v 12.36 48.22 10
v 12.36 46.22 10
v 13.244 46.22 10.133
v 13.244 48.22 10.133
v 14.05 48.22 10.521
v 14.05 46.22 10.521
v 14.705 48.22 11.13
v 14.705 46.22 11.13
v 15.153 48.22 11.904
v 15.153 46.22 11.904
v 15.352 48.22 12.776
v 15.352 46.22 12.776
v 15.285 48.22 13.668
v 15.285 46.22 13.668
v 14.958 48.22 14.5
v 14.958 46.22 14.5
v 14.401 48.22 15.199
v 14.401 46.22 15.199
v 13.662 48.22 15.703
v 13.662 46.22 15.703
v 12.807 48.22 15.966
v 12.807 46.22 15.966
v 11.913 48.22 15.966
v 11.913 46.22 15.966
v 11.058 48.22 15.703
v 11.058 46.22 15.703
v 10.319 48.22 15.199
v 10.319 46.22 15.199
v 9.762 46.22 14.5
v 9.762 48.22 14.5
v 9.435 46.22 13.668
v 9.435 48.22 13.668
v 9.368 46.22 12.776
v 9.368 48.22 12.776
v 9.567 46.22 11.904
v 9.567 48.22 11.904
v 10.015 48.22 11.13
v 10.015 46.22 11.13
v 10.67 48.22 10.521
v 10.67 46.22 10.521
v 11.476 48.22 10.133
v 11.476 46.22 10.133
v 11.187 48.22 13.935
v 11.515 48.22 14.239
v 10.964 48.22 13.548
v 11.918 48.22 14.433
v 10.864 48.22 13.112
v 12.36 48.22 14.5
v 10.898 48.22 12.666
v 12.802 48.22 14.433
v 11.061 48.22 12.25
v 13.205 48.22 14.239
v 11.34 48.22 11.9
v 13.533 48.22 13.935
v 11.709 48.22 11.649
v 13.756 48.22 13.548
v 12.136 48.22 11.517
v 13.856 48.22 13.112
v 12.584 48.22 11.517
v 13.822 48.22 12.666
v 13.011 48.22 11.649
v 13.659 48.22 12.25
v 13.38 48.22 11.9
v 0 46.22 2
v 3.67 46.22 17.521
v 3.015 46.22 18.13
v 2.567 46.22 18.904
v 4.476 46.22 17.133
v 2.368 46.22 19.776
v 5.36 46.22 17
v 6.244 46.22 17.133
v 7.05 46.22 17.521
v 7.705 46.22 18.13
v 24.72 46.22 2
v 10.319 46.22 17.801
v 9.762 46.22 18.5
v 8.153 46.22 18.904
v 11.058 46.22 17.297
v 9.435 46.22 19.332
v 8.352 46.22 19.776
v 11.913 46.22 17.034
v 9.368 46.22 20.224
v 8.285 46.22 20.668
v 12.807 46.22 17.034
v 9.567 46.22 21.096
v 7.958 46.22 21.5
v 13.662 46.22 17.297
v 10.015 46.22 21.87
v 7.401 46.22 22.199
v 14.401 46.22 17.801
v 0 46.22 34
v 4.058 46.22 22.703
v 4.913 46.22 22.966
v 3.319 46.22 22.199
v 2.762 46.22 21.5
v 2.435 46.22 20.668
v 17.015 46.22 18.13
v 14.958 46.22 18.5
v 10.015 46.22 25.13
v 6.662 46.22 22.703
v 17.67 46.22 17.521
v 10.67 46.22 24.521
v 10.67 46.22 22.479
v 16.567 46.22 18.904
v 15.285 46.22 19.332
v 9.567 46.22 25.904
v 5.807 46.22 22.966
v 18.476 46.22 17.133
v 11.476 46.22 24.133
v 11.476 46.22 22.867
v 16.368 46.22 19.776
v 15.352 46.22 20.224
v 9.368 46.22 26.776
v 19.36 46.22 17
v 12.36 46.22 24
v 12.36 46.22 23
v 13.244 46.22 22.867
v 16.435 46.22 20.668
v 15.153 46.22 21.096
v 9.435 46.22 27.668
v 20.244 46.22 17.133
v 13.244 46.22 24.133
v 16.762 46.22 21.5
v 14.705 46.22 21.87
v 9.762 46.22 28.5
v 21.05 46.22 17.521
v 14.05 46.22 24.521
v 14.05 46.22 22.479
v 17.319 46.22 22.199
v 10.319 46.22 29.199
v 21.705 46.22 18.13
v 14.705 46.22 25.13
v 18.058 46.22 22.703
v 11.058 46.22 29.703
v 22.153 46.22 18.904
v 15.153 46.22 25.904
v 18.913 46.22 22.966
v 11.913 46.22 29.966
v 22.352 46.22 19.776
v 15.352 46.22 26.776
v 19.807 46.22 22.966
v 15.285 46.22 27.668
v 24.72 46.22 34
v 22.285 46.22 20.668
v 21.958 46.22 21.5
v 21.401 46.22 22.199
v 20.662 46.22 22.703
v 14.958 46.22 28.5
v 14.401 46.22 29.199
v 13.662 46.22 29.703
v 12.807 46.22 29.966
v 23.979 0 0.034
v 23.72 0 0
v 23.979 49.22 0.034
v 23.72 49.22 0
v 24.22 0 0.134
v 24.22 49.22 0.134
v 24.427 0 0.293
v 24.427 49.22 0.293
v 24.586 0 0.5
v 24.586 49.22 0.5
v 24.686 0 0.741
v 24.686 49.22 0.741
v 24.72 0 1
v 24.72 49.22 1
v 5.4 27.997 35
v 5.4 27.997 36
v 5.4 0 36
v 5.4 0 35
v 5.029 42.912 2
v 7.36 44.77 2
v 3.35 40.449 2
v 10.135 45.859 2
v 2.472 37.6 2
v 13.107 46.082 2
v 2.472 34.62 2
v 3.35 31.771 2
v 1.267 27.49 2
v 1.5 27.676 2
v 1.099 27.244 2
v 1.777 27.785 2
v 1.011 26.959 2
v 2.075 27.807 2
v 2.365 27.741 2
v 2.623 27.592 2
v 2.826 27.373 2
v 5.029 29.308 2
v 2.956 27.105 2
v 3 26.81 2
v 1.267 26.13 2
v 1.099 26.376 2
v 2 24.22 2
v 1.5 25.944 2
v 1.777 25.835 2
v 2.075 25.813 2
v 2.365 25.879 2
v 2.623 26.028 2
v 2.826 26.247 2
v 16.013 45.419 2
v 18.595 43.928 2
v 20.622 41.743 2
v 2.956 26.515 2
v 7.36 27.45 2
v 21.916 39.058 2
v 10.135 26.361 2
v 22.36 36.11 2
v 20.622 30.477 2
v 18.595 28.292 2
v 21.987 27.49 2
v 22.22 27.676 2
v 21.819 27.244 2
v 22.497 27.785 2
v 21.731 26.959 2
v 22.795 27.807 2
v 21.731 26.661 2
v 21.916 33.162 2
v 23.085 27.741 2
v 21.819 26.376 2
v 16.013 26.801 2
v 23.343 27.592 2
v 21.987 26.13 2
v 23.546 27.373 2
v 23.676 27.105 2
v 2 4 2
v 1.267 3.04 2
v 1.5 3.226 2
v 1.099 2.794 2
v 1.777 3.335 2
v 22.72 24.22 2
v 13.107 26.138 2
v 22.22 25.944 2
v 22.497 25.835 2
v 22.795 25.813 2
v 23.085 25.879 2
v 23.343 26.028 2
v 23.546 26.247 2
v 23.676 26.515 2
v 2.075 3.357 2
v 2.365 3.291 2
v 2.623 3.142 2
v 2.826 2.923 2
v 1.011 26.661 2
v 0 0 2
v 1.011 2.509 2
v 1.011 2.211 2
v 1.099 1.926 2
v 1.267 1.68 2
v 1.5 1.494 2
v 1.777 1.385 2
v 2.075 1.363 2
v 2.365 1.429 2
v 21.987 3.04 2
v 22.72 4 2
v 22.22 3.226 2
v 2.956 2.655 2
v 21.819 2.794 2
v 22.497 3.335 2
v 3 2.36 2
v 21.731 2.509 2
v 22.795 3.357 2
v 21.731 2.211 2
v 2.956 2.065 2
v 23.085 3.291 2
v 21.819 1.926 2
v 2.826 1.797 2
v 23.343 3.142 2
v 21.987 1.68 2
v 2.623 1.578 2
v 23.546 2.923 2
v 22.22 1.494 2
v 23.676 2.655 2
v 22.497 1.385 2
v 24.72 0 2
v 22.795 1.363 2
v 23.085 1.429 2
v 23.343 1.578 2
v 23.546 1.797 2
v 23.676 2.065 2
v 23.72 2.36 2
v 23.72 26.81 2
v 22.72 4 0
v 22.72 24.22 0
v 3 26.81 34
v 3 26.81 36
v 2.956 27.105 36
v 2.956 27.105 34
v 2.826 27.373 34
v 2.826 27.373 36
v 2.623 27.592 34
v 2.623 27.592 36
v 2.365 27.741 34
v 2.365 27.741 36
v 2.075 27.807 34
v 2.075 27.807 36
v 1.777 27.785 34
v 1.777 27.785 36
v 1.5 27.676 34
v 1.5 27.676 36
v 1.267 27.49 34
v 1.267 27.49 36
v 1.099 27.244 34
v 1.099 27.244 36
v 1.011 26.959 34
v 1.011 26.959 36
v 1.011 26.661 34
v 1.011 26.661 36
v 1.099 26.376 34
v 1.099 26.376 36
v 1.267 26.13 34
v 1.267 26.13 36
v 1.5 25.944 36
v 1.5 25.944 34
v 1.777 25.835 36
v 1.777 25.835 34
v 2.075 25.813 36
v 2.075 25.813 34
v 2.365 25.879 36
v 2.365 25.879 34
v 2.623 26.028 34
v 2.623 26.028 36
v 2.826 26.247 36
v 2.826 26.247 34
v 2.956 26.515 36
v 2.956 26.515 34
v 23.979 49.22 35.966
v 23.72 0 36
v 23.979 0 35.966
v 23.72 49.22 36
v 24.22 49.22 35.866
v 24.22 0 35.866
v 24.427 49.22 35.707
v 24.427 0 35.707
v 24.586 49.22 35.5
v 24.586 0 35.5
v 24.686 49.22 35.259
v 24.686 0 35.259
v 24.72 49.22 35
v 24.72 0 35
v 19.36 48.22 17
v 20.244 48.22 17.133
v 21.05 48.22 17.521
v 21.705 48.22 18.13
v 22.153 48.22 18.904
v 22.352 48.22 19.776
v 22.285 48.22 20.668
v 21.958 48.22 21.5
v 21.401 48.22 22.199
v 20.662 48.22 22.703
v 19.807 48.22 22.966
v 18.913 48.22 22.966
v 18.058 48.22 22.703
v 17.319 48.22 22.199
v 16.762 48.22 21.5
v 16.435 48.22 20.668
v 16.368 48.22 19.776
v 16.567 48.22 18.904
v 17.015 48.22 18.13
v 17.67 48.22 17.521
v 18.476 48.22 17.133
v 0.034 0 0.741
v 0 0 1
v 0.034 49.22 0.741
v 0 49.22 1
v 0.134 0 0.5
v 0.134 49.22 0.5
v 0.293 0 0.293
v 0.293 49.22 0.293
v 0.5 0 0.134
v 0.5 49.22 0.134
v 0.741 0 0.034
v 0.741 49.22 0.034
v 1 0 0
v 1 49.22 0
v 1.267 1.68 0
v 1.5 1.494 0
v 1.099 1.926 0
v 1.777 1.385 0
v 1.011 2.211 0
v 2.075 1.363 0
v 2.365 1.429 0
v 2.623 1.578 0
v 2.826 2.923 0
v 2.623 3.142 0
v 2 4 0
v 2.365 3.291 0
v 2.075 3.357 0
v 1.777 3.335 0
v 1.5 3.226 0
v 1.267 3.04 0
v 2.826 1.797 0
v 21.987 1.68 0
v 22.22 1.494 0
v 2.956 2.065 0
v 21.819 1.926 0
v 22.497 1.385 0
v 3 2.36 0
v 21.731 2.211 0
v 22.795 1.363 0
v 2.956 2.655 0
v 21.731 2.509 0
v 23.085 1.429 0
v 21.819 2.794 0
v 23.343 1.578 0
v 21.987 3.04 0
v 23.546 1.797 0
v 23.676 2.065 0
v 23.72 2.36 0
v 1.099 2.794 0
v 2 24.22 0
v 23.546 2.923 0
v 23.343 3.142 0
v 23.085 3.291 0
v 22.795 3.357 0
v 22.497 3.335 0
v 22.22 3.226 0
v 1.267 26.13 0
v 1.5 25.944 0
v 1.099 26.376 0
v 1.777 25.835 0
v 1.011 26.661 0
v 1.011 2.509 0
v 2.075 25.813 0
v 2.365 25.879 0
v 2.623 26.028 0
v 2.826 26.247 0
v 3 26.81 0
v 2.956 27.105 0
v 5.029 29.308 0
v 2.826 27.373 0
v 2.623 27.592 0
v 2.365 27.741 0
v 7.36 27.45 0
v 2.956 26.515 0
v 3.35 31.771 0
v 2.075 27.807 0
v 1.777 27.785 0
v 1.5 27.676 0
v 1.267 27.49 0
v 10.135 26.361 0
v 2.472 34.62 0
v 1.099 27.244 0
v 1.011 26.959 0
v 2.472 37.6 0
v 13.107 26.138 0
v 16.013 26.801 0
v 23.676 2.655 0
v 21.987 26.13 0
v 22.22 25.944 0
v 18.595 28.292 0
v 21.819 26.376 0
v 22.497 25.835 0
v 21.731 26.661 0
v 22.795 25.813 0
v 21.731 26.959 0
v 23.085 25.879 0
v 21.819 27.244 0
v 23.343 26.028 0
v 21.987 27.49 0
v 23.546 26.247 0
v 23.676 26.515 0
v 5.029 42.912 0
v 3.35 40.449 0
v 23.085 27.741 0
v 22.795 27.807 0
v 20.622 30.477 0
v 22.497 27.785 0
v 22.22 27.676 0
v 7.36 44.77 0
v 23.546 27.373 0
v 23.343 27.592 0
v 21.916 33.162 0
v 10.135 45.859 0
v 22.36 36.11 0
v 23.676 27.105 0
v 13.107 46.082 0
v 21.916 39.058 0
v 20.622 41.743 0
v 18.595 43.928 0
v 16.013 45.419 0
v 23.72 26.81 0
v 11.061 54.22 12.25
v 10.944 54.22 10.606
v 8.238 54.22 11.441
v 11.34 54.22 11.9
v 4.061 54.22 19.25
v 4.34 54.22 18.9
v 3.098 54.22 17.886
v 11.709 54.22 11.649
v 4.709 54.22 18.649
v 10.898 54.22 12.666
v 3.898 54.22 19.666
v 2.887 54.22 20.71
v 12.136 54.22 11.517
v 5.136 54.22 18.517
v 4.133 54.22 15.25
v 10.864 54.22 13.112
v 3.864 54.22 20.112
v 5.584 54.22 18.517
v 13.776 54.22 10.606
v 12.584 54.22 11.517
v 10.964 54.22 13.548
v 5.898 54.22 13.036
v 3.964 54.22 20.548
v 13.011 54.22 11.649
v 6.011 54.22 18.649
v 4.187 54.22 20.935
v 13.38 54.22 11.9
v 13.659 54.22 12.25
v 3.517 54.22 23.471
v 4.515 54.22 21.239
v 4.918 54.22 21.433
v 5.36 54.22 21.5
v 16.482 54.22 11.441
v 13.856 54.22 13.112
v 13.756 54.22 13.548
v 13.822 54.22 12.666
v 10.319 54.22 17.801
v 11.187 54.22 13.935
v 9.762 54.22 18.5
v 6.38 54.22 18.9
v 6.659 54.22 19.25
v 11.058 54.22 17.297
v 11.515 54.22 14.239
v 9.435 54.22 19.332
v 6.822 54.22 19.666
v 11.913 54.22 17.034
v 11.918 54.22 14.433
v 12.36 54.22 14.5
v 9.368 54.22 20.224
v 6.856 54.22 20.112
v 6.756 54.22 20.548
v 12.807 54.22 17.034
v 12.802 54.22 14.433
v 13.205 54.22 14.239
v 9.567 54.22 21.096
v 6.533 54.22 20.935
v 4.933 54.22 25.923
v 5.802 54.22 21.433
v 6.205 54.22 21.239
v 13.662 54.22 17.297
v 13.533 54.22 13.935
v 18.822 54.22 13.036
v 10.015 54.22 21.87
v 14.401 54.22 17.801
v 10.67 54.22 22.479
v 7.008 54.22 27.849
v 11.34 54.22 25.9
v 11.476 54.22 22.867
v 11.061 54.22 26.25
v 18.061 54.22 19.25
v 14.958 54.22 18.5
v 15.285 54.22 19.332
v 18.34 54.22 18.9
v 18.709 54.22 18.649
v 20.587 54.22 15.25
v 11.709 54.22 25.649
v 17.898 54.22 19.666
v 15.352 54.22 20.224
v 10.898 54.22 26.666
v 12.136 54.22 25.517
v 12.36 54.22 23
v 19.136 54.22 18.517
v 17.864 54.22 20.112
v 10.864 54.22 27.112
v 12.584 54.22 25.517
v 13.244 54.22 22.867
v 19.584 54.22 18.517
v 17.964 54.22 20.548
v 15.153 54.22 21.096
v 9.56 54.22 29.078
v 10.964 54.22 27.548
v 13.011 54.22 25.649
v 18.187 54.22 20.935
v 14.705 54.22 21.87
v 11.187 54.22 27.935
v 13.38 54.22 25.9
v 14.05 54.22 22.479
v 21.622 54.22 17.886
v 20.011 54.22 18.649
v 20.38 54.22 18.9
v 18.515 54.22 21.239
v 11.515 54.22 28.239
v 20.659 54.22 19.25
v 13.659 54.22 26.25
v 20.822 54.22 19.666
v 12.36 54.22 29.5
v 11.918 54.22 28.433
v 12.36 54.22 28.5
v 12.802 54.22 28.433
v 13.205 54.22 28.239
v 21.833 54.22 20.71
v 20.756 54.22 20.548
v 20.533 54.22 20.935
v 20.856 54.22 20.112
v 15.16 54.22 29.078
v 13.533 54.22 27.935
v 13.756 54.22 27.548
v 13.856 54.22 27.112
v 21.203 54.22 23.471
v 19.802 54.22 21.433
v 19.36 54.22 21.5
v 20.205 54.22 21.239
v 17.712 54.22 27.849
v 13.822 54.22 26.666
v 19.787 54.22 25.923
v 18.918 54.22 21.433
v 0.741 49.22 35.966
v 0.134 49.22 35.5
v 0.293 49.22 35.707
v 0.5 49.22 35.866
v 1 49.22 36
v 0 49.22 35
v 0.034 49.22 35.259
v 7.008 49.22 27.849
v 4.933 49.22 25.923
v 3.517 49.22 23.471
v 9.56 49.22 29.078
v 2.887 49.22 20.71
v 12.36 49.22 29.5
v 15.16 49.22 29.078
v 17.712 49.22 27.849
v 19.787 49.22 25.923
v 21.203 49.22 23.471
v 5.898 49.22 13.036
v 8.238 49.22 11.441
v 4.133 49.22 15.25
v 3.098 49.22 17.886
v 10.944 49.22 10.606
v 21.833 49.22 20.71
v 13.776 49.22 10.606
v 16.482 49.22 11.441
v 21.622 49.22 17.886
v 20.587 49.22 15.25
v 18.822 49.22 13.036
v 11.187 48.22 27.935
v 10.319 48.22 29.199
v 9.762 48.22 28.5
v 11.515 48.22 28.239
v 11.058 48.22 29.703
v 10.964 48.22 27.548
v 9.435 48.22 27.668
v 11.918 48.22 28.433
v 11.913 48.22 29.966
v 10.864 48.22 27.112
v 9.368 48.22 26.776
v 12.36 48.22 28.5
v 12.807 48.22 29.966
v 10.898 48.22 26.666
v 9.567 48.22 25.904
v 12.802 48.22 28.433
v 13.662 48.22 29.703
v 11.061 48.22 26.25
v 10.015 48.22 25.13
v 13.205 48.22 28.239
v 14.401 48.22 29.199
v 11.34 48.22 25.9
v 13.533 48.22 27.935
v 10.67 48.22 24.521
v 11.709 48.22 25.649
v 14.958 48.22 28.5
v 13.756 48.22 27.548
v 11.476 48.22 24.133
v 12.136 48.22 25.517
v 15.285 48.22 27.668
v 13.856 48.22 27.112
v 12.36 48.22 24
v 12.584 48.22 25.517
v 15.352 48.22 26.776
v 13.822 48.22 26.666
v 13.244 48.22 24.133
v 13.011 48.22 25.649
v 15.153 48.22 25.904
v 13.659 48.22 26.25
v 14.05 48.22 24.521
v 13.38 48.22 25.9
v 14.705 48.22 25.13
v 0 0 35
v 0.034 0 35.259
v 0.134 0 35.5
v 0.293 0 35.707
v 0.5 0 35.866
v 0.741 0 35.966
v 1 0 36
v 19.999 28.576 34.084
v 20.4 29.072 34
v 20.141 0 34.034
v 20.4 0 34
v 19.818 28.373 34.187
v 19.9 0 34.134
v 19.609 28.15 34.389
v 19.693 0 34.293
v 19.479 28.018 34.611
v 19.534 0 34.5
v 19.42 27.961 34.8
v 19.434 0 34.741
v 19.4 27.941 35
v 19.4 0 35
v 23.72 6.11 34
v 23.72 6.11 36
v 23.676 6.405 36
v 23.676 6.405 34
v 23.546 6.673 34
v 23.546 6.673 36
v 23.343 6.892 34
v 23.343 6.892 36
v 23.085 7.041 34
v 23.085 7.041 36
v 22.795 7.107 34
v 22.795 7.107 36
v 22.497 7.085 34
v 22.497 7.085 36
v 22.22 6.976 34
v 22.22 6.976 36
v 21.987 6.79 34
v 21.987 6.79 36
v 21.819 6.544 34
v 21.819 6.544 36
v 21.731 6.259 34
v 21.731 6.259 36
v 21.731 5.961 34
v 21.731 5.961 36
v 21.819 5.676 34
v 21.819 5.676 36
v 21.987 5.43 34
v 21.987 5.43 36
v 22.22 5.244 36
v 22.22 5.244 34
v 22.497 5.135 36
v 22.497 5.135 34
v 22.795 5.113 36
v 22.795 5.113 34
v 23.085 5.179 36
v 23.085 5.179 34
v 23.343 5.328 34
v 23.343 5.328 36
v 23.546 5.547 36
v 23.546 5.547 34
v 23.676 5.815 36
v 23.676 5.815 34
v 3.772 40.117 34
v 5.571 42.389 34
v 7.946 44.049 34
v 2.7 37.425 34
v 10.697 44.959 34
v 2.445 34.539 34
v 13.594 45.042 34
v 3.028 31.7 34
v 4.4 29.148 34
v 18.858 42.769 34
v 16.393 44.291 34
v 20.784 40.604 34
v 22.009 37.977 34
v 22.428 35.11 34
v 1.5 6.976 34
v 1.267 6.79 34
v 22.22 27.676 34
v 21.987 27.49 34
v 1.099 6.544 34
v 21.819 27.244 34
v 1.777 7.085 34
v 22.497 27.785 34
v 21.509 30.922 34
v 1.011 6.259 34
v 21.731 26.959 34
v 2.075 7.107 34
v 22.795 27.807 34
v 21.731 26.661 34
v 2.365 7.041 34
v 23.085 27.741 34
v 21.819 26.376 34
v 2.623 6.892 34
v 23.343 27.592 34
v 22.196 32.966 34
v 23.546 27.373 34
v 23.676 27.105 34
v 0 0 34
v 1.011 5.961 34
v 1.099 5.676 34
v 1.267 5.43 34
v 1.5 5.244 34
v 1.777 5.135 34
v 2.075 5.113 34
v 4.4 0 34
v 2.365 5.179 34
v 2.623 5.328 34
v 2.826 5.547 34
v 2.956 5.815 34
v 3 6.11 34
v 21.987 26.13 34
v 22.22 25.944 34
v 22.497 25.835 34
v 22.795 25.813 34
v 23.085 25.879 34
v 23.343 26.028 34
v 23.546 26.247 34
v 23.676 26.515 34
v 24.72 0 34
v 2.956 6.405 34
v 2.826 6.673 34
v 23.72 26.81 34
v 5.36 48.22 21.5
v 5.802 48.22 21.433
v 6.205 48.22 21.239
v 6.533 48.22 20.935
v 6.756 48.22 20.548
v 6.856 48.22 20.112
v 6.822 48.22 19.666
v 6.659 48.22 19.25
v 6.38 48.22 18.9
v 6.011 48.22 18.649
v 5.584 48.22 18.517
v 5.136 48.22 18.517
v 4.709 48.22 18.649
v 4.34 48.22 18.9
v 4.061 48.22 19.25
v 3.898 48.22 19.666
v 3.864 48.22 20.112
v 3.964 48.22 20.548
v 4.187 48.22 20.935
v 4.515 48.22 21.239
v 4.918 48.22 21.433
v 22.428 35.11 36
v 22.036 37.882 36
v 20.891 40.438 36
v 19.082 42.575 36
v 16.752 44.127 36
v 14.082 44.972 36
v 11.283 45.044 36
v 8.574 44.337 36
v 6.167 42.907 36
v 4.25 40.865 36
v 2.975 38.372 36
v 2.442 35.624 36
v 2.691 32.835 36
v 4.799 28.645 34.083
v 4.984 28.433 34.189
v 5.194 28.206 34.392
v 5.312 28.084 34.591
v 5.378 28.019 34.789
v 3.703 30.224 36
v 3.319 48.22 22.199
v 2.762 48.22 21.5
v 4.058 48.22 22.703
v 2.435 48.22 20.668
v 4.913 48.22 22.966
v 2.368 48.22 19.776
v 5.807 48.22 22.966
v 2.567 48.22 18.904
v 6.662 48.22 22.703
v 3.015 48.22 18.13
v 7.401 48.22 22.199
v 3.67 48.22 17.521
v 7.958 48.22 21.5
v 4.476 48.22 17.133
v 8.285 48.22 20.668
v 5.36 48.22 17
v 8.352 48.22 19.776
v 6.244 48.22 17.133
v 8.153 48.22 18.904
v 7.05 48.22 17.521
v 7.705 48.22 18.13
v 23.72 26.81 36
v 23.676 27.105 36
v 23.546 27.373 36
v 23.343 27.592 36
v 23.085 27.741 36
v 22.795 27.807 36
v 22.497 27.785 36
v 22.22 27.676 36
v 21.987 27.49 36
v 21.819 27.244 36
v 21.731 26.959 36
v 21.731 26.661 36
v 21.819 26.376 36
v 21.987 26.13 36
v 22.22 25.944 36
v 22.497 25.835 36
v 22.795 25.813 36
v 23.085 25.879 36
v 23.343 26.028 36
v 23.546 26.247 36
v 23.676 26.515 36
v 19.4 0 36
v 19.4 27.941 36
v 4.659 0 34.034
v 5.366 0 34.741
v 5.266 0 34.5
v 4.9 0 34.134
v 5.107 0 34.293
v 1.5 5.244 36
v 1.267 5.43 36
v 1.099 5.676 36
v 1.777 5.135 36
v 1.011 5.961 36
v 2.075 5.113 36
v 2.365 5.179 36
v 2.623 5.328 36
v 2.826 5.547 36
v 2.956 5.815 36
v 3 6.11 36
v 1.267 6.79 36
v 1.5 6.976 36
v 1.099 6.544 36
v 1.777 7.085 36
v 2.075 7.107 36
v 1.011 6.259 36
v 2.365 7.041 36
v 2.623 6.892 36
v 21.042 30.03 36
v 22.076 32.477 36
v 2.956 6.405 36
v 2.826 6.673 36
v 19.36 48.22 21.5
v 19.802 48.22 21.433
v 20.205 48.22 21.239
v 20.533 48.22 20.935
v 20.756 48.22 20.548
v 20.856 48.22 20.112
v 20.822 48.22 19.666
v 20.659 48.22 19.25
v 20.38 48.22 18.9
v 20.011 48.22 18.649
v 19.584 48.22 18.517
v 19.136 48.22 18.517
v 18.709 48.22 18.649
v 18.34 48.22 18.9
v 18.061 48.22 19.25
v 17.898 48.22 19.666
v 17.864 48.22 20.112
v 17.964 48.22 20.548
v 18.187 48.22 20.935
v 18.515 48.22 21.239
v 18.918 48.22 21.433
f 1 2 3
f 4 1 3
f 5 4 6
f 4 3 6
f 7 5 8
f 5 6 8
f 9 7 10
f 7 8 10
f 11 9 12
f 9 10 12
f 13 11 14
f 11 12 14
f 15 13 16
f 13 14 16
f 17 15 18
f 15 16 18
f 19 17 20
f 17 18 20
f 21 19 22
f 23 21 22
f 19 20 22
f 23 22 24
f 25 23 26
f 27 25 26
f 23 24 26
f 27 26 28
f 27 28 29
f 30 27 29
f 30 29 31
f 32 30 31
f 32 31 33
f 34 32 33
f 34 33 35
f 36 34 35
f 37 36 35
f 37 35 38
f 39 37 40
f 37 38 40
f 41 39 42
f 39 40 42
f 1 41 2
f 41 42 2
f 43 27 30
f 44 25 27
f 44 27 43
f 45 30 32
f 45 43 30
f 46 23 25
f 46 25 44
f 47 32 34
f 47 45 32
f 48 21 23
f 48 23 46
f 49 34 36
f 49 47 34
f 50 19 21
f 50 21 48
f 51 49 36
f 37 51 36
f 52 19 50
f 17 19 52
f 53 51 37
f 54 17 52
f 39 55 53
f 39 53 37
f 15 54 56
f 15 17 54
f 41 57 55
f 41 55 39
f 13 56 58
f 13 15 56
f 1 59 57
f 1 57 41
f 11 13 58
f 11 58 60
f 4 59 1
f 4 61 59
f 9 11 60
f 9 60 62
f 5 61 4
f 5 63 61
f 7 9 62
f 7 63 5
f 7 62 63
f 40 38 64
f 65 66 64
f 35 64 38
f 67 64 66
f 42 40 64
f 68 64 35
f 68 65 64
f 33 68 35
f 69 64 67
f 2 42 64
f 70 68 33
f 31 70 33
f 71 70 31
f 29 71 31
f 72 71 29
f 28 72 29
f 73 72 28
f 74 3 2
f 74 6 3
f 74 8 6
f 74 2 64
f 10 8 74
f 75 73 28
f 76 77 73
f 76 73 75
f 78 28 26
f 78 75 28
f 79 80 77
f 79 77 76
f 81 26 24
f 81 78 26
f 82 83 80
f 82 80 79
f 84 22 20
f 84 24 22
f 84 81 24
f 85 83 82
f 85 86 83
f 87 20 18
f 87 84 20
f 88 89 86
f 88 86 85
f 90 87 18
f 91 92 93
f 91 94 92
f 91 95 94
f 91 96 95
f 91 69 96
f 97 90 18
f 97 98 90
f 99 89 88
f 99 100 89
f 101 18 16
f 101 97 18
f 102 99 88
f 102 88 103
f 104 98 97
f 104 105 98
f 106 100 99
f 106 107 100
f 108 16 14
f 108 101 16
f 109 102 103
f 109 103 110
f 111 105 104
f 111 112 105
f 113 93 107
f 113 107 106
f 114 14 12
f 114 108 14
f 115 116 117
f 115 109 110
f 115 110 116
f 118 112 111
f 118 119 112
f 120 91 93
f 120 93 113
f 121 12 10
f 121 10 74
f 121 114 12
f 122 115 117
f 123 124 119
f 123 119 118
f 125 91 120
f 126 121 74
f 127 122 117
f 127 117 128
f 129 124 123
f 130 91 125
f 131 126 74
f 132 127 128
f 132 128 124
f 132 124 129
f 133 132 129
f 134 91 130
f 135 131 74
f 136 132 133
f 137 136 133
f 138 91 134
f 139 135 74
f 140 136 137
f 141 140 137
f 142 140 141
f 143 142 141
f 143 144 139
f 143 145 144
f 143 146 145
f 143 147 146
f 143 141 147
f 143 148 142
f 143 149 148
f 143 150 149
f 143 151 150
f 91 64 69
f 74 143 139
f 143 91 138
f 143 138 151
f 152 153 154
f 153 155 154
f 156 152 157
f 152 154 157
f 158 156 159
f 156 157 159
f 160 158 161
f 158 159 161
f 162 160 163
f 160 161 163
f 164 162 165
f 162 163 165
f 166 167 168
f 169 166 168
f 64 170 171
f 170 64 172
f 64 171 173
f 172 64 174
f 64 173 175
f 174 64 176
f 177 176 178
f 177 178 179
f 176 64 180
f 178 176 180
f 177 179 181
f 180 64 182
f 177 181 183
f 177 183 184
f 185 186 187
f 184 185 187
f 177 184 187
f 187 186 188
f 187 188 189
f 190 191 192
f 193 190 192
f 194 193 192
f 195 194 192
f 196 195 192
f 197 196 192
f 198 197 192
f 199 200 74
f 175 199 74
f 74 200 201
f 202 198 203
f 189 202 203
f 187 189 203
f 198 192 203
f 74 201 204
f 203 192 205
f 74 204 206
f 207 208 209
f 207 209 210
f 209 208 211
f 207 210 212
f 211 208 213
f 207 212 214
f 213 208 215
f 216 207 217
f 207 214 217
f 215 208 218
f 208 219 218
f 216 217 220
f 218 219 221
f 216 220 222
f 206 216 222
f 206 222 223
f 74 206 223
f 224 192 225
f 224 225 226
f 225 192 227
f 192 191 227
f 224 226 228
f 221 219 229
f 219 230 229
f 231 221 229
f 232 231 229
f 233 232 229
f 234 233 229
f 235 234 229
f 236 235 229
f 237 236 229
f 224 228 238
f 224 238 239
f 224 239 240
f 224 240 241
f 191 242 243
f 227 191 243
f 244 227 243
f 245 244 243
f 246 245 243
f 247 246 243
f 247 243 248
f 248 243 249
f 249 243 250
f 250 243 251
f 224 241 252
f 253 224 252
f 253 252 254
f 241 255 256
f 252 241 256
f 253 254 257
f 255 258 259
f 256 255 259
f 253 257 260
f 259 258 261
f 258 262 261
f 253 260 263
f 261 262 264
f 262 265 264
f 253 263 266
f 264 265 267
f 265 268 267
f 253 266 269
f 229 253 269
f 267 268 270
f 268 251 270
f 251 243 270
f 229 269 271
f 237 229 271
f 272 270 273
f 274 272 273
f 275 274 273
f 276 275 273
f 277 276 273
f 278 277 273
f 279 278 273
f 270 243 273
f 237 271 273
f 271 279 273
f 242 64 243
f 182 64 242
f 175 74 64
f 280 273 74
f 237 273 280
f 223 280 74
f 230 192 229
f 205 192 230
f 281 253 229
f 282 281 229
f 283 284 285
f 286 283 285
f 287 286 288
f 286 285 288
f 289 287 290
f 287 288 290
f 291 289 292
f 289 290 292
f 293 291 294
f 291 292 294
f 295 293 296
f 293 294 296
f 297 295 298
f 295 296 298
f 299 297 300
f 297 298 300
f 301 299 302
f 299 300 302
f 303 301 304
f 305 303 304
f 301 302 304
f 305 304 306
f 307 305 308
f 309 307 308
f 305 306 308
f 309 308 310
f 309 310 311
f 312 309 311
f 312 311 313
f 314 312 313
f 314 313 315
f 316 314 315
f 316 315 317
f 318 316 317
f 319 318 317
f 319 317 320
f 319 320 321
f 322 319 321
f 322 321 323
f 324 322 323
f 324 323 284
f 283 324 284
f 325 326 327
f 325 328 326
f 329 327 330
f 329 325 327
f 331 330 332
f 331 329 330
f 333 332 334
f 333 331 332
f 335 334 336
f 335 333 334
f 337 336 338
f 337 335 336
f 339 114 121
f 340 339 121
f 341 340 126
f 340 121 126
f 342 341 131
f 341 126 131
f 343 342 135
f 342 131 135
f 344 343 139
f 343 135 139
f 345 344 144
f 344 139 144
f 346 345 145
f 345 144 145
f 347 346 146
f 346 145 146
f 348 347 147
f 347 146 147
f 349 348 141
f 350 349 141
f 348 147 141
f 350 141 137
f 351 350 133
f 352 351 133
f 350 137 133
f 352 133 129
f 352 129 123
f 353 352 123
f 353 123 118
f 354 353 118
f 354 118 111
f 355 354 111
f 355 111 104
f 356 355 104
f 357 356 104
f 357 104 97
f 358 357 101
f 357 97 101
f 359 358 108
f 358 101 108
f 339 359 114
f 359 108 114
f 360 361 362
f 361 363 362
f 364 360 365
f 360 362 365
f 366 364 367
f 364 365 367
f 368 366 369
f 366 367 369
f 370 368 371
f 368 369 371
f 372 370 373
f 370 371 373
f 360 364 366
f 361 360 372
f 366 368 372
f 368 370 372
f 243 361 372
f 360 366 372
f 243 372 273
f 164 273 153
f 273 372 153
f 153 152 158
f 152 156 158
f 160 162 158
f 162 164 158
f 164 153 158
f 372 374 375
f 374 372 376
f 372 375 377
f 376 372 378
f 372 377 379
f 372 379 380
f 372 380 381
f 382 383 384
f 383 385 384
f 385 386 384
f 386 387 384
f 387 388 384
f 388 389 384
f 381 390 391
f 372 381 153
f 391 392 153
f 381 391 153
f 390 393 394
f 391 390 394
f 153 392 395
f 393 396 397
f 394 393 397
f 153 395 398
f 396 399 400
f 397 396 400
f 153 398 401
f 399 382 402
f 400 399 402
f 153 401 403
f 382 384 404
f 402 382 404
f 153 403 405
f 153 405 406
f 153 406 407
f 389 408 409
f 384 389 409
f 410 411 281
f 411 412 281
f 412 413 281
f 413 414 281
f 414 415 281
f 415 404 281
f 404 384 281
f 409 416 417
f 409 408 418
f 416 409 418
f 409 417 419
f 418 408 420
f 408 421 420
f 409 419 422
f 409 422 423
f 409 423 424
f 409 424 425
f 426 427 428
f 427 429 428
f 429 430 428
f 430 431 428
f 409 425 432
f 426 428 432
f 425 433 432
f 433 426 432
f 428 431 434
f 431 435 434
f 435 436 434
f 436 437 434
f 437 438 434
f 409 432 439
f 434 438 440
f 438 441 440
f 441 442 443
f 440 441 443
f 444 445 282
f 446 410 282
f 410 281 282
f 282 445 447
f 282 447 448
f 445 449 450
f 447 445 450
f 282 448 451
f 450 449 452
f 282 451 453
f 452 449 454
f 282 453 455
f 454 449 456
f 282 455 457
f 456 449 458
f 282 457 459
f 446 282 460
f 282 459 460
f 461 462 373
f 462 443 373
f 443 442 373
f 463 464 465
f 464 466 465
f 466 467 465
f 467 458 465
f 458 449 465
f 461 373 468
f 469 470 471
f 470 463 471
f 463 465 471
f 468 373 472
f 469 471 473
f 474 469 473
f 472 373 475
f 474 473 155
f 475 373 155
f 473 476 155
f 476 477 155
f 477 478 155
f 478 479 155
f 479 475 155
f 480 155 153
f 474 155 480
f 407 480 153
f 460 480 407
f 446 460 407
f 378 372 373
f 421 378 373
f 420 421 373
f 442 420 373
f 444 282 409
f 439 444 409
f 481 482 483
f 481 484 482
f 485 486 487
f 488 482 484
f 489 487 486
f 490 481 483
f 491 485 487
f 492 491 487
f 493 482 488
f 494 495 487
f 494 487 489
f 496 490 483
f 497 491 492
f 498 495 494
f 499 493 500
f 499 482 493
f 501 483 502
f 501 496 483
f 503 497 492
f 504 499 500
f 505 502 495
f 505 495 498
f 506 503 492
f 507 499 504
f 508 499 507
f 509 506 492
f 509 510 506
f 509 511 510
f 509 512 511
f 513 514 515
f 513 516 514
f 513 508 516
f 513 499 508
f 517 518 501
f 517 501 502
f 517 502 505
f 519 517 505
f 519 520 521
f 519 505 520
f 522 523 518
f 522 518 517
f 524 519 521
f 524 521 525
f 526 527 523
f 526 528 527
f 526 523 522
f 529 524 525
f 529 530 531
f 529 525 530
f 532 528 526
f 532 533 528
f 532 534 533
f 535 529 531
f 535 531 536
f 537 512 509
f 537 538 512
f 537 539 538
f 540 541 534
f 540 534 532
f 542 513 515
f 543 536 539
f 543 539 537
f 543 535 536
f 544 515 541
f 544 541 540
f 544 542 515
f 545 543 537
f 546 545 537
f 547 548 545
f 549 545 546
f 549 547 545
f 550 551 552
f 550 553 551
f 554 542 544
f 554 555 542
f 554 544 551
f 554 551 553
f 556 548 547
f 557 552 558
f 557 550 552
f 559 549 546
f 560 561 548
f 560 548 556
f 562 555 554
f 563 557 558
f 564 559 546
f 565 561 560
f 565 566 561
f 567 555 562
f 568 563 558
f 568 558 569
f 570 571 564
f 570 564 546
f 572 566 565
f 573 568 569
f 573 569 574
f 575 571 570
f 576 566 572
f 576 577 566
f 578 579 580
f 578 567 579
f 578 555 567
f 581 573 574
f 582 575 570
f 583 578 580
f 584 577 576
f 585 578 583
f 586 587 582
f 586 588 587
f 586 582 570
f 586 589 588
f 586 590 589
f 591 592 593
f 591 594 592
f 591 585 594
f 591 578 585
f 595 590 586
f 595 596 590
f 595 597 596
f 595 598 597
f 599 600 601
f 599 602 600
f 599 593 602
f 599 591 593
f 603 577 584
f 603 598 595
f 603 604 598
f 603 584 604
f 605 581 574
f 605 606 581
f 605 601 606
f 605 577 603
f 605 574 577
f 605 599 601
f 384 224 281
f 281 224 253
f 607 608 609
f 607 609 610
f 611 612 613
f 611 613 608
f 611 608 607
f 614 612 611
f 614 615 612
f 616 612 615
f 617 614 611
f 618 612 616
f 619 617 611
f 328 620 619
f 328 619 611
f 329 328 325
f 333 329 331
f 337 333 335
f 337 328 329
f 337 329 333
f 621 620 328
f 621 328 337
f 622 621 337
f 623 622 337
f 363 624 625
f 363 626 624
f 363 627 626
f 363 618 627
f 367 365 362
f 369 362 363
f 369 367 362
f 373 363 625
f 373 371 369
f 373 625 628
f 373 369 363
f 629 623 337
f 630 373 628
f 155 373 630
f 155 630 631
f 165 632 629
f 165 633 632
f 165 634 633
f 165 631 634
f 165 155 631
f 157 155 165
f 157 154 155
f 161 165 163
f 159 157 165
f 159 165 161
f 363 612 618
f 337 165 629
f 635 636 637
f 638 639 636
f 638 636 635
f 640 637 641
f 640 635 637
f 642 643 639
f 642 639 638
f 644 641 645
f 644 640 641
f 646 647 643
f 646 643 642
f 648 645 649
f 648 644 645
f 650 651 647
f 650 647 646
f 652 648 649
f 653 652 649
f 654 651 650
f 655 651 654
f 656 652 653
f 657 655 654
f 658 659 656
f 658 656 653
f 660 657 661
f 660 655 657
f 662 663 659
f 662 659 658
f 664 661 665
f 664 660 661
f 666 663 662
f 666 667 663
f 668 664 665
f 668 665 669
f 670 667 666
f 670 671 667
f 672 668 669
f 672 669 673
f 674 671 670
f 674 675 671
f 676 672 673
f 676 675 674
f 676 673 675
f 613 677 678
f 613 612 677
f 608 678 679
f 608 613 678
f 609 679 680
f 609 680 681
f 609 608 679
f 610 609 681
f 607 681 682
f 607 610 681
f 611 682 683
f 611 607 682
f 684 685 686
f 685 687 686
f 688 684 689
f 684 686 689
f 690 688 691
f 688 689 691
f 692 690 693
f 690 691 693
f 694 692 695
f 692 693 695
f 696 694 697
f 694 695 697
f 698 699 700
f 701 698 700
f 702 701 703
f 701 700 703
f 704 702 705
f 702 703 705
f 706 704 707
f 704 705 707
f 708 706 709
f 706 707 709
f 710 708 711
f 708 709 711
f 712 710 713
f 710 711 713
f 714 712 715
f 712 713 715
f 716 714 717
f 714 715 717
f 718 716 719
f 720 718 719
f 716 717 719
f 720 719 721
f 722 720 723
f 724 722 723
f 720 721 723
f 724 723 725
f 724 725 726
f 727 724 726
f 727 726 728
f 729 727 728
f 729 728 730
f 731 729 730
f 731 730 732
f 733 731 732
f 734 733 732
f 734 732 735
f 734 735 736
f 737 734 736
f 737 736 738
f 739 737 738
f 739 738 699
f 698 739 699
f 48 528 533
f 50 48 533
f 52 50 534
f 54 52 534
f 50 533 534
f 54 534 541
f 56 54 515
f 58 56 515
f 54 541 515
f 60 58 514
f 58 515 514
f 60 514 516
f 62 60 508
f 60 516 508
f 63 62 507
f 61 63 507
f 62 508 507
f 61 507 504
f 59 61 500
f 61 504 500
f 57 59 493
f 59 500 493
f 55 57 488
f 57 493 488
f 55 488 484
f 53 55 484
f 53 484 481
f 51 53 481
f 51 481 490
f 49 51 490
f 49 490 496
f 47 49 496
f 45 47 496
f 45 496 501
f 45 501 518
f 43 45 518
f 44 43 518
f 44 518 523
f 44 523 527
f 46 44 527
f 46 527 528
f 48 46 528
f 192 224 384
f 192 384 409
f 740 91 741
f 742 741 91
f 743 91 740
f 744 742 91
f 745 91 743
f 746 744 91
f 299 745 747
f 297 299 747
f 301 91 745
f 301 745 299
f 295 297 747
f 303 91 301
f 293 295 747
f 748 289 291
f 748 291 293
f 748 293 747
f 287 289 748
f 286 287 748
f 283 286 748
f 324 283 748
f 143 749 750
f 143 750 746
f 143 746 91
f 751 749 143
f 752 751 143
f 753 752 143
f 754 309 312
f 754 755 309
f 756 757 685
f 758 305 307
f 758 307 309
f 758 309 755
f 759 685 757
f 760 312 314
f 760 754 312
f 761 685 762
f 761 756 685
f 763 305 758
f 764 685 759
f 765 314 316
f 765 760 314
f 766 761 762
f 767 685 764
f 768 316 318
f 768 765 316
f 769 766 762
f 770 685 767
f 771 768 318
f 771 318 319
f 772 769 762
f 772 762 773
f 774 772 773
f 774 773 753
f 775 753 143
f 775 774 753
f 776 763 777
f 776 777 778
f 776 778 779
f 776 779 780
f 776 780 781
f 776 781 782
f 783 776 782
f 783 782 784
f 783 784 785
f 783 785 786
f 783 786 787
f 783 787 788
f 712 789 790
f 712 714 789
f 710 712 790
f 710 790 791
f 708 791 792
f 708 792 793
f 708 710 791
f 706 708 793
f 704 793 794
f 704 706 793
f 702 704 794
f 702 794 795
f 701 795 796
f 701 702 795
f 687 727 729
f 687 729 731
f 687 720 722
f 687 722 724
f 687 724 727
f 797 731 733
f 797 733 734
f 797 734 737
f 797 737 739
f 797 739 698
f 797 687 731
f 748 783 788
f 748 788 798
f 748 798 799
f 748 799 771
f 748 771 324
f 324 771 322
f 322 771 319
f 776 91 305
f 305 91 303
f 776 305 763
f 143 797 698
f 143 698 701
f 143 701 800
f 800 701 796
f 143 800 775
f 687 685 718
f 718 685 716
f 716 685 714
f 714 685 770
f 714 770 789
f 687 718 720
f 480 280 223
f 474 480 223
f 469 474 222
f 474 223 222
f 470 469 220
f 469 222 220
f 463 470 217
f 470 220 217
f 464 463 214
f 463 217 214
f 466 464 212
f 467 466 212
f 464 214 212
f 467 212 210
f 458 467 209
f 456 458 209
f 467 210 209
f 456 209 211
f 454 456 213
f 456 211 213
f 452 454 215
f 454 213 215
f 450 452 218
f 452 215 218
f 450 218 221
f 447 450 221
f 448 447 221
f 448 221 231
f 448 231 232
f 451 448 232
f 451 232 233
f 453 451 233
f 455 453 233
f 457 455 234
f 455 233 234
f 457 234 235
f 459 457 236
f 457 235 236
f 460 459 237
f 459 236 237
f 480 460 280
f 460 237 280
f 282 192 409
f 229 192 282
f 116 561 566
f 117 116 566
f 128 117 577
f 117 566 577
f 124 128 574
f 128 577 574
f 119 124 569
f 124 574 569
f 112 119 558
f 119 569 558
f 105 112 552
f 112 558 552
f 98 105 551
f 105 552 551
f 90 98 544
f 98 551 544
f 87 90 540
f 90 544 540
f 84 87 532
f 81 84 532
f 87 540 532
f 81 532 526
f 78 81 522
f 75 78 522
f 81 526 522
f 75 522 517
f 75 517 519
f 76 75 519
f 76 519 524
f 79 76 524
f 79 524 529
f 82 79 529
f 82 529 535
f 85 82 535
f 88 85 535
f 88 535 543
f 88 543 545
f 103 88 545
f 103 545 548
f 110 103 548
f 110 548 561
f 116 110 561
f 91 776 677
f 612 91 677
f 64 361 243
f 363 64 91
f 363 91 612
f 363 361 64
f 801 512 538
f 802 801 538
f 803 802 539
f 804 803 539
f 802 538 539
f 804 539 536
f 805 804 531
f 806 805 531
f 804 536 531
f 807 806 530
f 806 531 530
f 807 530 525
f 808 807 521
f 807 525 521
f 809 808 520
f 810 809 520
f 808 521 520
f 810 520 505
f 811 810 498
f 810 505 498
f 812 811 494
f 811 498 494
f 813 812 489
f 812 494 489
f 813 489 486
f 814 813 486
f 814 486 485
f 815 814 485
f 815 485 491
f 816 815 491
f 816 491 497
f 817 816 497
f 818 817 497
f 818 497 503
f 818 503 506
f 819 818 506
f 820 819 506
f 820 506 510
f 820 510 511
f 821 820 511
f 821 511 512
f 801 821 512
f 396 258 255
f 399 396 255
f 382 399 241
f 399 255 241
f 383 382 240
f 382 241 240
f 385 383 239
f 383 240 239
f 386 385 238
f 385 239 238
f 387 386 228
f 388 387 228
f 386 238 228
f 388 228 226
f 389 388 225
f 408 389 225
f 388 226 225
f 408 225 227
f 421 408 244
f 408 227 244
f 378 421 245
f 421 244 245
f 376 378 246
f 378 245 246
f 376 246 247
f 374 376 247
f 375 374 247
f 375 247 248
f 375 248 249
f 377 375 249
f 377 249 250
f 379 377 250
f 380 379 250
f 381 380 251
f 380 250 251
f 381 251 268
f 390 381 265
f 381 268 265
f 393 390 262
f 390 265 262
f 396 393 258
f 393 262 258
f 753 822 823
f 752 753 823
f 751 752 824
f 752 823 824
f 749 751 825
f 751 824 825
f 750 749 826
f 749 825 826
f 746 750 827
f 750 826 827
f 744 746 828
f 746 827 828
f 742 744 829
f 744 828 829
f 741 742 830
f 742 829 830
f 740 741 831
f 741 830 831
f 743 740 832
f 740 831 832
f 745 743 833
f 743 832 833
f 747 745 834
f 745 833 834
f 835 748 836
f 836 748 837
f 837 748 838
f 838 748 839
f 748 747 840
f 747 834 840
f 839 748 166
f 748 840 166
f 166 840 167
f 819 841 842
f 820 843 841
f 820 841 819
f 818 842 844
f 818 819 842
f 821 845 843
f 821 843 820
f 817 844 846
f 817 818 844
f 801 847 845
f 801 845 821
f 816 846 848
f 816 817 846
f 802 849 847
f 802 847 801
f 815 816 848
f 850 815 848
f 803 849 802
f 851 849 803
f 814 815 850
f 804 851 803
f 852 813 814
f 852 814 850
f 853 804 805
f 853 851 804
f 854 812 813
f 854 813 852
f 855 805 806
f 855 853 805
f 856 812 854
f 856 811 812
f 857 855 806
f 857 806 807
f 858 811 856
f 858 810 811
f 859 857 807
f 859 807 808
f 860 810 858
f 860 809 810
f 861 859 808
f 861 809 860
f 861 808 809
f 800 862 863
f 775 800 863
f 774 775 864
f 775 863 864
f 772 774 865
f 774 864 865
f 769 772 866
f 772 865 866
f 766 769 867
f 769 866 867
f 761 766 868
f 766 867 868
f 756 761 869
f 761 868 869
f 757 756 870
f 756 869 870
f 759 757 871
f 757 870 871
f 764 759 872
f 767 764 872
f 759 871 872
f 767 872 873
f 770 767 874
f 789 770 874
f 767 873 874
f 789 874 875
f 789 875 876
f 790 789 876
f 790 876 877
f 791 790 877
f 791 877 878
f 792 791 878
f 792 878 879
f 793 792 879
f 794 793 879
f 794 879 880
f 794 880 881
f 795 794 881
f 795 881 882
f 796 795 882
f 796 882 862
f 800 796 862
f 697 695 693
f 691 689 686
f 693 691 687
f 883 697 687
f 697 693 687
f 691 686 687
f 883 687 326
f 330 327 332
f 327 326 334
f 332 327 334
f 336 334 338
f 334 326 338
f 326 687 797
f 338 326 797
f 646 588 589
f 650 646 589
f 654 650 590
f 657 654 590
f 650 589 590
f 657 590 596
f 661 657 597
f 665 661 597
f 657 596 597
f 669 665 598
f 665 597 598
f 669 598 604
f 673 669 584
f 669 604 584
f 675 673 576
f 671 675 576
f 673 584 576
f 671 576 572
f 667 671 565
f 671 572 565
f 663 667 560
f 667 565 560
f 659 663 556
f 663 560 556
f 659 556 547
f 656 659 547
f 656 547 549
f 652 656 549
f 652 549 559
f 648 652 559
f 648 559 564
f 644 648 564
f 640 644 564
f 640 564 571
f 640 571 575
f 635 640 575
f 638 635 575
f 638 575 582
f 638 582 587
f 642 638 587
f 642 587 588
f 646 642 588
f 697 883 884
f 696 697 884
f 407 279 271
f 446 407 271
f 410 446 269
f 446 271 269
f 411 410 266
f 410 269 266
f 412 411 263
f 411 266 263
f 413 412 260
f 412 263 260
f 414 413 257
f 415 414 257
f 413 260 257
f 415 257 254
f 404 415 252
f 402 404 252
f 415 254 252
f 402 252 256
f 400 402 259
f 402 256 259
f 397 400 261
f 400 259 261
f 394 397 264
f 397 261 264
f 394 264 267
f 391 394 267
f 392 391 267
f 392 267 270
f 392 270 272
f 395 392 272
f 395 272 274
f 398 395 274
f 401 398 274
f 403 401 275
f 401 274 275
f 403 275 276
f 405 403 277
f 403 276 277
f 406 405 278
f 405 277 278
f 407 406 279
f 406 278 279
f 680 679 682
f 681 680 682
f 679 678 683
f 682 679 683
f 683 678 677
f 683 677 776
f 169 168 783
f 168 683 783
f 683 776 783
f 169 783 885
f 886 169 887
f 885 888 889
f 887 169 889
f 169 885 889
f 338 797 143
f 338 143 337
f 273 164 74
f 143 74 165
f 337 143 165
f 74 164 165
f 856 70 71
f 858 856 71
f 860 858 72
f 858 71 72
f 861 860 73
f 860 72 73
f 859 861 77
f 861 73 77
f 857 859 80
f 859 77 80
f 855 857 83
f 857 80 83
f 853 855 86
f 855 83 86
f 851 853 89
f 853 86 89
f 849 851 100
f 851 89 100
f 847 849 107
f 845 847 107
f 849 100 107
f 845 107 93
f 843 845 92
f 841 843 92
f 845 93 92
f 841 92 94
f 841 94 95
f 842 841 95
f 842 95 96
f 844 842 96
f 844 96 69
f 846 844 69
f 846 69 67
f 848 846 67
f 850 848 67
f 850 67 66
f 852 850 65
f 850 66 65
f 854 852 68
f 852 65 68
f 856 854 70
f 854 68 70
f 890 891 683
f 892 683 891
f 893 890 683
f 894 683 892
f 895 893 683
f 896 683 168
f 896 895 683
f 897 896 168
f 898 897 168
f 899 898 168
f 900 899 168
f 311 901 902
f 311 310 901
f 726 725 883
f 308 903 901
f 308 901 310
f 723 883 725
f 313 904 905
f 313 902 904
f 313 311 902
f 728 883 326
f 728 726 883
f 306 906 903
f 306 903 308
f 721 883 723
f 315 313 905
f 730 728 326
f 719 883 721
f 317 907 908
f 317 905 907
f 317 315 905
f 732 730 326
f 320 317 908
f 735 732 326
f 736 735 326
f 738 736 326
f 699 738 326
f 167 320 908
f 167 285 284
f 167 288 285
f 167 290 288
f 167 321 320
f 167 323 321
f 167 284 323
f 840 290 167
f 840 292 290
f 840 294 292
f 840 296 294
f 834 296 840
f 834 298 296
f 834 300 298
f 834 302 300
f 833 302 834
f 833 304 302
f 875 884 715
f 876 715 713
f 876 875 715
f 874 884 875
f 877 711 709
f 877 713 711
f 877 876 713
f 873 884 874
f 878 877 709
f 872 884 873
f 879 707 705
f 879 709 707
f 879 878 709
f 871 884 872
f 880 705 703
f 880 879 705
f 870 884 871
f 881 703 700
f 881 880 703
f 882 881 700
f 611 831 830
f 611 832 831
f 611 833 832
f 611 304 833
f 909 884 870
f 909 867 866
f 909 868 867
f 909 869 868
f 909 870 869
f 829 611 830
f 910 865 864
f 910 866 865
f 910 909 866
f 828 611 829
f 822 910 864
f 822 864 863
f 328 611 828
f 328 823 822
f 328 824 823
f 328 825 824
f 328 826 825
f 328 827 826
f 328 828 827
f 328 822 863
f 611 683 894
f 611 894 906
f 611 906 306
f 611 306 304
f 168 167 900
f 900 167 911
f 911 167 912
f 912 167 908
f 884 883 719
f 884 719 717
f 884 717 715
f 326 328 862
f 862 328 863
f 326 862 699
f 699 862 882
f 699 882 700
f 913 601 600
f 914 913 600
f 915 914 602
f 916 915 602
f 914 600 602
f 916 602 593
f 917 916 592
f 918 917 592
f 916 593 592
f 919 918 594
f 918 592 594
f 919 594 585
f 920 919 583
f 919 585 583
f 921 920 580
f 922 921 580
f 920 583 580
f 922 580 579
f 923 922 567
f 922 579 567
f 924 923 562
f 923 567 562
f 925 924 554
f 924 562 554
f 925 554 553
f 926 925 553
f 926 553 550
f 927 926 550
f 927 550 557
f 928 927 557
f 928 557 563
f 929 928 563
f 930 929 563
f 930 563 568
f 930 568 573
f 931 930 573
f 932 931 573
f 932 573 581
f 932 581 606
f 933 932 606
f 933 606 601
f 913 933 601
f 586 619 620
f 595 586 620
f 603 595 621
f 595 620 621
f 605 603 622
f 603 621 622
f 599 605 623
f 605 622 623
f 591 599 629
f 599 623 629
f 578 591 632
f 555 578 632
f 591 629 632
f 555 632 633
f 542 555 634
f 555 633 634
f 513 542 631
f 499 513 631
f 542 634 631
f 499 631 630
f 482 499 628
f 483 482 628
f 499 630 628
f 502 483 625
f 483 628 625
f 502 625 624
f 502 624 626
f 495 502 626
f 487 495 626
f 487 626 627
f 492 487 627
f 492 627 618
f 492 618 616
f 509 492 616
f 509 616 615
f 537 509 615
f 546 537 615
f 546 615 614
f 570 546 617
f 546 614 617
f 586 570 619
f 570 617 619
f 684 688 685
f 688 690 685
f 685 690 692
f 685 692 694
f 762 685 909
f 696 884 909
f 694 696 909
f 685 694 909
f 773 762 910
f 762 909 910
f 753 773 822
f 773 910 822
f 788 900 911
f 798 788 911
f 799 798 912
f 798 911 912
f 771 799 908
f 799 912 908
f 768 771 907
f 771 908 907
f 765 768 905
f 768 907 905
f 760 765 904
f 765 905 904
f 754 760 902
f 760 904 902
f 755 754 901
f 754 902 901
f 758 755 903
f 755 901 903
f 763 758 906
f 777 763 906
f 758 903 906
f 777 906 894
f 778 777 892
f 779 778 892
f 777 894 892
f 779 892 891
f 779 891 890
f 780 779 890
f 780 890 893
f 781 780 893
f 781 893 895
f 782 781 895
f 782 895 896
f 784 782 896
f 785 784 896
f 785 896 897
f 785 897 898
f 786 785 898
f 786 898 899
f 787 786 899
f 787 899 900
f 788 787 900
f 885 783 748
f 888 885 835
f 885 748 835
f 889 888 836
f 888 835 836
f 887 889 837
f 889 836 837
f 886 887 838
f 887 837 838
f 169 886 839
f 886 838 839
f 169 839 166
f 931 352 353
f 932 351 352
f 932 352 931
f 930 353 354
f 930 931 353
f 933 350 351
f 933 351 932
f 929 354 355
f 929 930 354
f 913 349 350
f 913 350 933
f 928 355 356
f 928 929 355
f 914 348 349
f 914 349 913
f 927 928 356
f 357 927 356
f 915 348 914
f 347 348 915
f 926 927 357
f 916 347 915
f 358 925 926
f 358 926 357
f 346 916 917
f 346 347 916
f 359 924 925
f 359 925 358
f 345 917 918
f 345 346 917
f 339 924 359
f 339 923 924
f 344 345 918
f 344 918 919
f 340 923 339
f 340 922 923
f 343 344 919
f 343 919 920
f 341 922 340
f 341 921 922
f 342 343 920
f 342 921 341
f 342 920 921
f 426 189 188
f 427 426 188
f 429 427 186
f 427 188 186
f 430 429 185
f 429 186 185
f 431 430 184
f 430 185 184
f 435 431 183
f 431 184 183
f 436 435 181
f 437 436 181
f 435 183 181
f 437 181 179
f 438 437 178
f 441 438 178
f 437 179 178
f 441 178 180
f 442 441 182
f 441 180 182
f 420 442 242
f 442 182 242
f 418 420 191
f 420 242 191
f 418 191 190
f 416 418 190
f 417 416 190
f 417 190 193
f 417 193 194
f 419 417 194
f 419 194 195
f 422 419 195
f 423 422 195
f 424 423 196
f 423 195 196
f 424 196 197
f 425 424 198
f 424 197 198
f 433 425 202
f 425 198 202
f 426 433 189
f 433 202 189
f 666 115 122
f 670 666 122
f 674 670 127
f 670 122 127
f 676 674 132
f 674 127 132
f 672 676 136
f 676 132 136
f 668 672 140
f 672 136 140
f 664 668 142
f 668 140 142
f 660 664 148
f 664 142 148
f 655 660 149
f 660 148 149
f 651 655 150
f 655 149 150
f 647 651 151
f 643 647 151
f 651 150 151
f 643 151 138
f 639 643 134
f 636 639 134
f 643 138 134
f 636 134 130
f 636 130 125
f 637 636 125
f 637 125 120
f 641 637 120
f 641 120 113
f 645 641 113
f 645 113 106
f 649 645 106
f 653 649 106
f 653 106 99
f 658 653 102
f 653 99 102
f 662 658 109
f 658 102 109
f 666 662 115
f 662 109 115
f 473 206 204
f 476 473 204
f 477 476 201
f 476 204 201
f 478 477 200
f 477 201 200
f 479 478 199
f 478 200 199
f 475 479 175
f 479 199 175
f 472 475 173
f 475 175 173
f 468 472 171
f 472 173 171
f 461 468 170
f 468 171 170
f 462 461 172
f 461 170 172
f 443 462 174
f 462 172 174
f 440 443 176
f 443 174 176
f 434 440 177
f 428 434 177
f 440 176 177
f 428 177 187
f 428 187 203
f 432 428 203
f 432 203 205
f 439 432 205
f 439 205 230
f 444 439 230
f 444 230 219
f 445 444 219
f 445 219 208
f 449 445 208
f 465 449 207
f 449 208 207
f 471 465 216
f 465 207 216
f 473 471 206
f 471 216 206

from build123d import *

# Parameters (mm, degrees)
SKETCH_1_W          = 24.72
SKETCH_1_H          = 49.22
EXTRUDE_1_DEPTH     = 36
SKETCH_3_W          = 24.72
SKETCH_3_H          = 32
CUT_EXTRUDE_1_DEPTH = 46.22
SKETCH_4_R          = 1
SKETCH_4_R_2        = 10
SKETCH_4_W          = 20.72
SKETCH_4_H          = 20.22
CUT_EXTRUDE_2_DEPTH = 2
SKETCH_6_R          = 1
CUT_EXTRUDE_3_DEPTH = 6
SKETCH_7_R          = 9.5
EXTRUDE_2_DEPTH     = 5
SKETCH_8_R          = 1.5
CUT_EXTRUDE_4_DEPTH = 8
FILLET_5_R          = 1
FILLET_6_R          = 1
FILLET_7_R          = 1
FILLET_8_R          = 1
FILLET_9_R          = 1
FILLET_10_R         = 1
SKETCH_9_R          = 3
CUT_EXTRUDE_5_DEPTH = 10
SKETCH_10_R         = 3
CUT_EXTRUDE_6_DEPTH = 2


with BuildPart() as part:
    # 草图1 → 凸台-拉伸1 (new body)
    with BuildSketch(Plane.XY):
        with Locations((12.36, 24.61)):
            Rectangle(SKETCH_1_W, SKETCH_1_H)
    extrude(amount=EXTRUDE_1_DEPTH)

    # 草图3 → 切除-拉伸1 (cut)
    with BuildSketch(Plane.XZ):
        with Locations((12.36, 18)):
            Rectangle(SKETCH_3_W, SKETCH_3_H)
    extrude(amount=-CUT_EXTRUDE_1_DEPTH, mode=Mode.SUBTRACT)

    # 草图4 → 切除-拉伸2 (cut)
    with BuildSketch(Plane.XY.offset(2)):
        with Locations((2, 2.36)):
            Circle(SKETCH_4_R)
        with Locations((22.72, 2.36)):
            Circle(SKETCH_4_R)
        with Locations((22.72, 26.81)):
            Circle(SKETCH_4_R)
        with Locations((2, 26.81)):
            Circle(SKETCH_4_R)
        with Locations((12.36, 36.11)):
            Circle(SKETCH_4_R_2)
        with Locations((12.36, 14.11)):
            Rectangle(SKETCH_4_W, SKETCH_4_H)
    extrude(amount=-CUT_EXTRUDE_2_DEPTH, mode=Mode.SUBTRACT)

    # 草图6 → 切除-拉伸3 (cut)
    with BuildSketch(Plane.XY.offset(36)):
        with BuildLine():
            Line((5.4, 27.996527822), (5.4, 28))
            Line((5.4, 28), (19.4, 28))
            Line((19.4, 28), (19.4, 27.940836898))
            ThreePointArc((19.4, 27.940836898), (21.640245754, 31.218722824), (22.428407613, 35.11))
            ThreePointArc((22.428407613, 35.11), (8.573804918, 44.337244337), (5.4, 27.996527822))
        make_face()
        with BuildLine():
            Line((19.4, 28), (5.4, 28))
            Line((5.4, 28), (5.4, 27.996527822))
            ThreePointArc((5.4, 27.996527822), (12.388628696, 25.110079118), (19.4, 27.940836898))
            Line((19.4, 27.940836898), (19.4, 28))
        make_face()
        with BuildLine():
            ThreePointArc((19.4, 27.940836898), (12.388628696, 25.110079118), (5.4, 27.996527822))
            Line((5.4, 27.996527822), (5.4, 0))
            Line((5.4, 0), (19.4, 0))
            Line((19.4, 0), (19.4, 27.940836898))
        make_face()
        with Locations((2, 26.81)):
            Circle(SKETCH_6_R)
        with Locations((22.72, 6.11)):
            Circle(SKETCH_6_R)
        with Locations((2, 6.11)):
            Circle(SKETCH_6_R)
        with Locations((22.72, 26.81)):
            Circle(SKETCH_6_R)
    extrude(amount=-CUT_EXTRUDE_3_DEPTH, mode=Mode.SUBTRACT)

    # 草图7 → 凸台-拉伸2 (add)
    with BuildSketch(Plane(origin=(0, 49.22, 0), x_dir=(1, 0, 0), z_dir=(0, 1, 0))):
        with Locations(Location((12.36, -20, 0), (0, 0, 270))):
            Circle(SKETCH_7_R)
    extrude(amount=EXTRUDE_2_DEPTH)

    # 草图8 → 切除-拉伸4 (cut)
    with BuildSketch(Plane(origin=(0, 54.22, 0), x_dir=(1, 0, 0), z_dir=(0, 1, 0))):
        with Locations(Location((12.36, -13, 0), (0, 0, 270))):
            Circle(SKETCH_8_R)
        with Locations(Location((12.36, -27, 0), (0, 0, 270))):
            Circle(SKETCH_8_R)
        with Locations(Location((19.36, -20, 0), (0, 0, 270))):
            Circle(SKETCH_8_R)
        with Locations(Location((5.36, -20, 0), (0, 0, 270))):
            Circle(SKETCH_8_R)
    extrude(amount=-CUT_EXTRUDE_4_DEPTH, mode=Mode.SUBTRACT)

    # 圆角5
    fillet_5_edges = [part.edges().sort_by_distance(p)[0] for p in [
        (0, 24.61, 36),
    ]]
    fillet(fillet_5_edges, radius=FILLET_5_R - 0.0001)  # a hair under: the kernel refuses the full size

    # 圆角6
    fillet_6_edges = [part.edges().sort_by_distance(p)[0] for p in [
        (24.72, 24.61, 36),
    ]]
    fillet(fillet_6_edges, radius=FILLET_6_R - 0.0001)  # a hair under: the kernel refuses the full size

    # 圆角7
    fillet_7_edges = [part.edges().sort_by_distance(p)[0] for p in [
        (0, 24.61, 0),
    ]]
    fillet(fillet_7_edges, radius=FILLET_7_R - 0.0001)  # a hair under: the kernel refuses the full size

    # 圆角8
    fillet_8_edges = [part.edges().sort_by_distance(p)[0] for p in [
        (24.72, 24.61, 0),
    ]]
    fillet(fillet_8_edges, radius=FILLET_8_R - 0.0001)  # a hair under: the kernel refuses the full size

    # 圆角9
    fillet_9_edges = [part.edges().sort_by_distance(p)[0] for p in [
        (19.4, 13.970418449, 34),
    ]]
    fillet(fillet_9_edges, radius=FILLET_9_R)

    # 圆角10
    fillet_10_edges = [part.edges().sort_by_distance(p)[0] for p in [
        (5.4, 13.998263911, 34),
    ]]
    fillet(fillet_10_edges, radius=FILLET_10_R)

    # 草图9 → 切除-拉伸5 (cut)
    with BuildSketch(Plane(origin=(0, 54.22, 0), x_dir=(1, 0, 0), z_dir=(0, 1, 0))):
        with Locations(Location((12.36, -20, 0), (0, 0, 270))):
            Circle(SKETCH_9_R)
    extrude(amount=-CUT_EXTRUDE_5_DEPTH, mode=Mode.SUBTRACT)

    # 草图10 → 切除-拉伸6 (cut)
    with BuildSketch(Plane.XZ.offset(-46.22)):
        with Locations(Location((12.36, 27, 0), (0, 0, 270))):
            Circle(SKETCH_10_R)
        with Locations(Location((5.36, 20, 0), (0, 0, 270))):
            Circle(SKETCH_10_R)
        with Locations(Location((12.36, 13, 0), (0, 0, 270))):
            Circle(SKETCH_10_R)
        with Locations(Location((19.36, 20, 0), (0, 0, 270))):
            Circle(SKETCH_10_R)
    extrude(amount=-CUT_EXTRUDE_6_DEPTH, mode=Mode.SUBTRACT)


solid = part.part
